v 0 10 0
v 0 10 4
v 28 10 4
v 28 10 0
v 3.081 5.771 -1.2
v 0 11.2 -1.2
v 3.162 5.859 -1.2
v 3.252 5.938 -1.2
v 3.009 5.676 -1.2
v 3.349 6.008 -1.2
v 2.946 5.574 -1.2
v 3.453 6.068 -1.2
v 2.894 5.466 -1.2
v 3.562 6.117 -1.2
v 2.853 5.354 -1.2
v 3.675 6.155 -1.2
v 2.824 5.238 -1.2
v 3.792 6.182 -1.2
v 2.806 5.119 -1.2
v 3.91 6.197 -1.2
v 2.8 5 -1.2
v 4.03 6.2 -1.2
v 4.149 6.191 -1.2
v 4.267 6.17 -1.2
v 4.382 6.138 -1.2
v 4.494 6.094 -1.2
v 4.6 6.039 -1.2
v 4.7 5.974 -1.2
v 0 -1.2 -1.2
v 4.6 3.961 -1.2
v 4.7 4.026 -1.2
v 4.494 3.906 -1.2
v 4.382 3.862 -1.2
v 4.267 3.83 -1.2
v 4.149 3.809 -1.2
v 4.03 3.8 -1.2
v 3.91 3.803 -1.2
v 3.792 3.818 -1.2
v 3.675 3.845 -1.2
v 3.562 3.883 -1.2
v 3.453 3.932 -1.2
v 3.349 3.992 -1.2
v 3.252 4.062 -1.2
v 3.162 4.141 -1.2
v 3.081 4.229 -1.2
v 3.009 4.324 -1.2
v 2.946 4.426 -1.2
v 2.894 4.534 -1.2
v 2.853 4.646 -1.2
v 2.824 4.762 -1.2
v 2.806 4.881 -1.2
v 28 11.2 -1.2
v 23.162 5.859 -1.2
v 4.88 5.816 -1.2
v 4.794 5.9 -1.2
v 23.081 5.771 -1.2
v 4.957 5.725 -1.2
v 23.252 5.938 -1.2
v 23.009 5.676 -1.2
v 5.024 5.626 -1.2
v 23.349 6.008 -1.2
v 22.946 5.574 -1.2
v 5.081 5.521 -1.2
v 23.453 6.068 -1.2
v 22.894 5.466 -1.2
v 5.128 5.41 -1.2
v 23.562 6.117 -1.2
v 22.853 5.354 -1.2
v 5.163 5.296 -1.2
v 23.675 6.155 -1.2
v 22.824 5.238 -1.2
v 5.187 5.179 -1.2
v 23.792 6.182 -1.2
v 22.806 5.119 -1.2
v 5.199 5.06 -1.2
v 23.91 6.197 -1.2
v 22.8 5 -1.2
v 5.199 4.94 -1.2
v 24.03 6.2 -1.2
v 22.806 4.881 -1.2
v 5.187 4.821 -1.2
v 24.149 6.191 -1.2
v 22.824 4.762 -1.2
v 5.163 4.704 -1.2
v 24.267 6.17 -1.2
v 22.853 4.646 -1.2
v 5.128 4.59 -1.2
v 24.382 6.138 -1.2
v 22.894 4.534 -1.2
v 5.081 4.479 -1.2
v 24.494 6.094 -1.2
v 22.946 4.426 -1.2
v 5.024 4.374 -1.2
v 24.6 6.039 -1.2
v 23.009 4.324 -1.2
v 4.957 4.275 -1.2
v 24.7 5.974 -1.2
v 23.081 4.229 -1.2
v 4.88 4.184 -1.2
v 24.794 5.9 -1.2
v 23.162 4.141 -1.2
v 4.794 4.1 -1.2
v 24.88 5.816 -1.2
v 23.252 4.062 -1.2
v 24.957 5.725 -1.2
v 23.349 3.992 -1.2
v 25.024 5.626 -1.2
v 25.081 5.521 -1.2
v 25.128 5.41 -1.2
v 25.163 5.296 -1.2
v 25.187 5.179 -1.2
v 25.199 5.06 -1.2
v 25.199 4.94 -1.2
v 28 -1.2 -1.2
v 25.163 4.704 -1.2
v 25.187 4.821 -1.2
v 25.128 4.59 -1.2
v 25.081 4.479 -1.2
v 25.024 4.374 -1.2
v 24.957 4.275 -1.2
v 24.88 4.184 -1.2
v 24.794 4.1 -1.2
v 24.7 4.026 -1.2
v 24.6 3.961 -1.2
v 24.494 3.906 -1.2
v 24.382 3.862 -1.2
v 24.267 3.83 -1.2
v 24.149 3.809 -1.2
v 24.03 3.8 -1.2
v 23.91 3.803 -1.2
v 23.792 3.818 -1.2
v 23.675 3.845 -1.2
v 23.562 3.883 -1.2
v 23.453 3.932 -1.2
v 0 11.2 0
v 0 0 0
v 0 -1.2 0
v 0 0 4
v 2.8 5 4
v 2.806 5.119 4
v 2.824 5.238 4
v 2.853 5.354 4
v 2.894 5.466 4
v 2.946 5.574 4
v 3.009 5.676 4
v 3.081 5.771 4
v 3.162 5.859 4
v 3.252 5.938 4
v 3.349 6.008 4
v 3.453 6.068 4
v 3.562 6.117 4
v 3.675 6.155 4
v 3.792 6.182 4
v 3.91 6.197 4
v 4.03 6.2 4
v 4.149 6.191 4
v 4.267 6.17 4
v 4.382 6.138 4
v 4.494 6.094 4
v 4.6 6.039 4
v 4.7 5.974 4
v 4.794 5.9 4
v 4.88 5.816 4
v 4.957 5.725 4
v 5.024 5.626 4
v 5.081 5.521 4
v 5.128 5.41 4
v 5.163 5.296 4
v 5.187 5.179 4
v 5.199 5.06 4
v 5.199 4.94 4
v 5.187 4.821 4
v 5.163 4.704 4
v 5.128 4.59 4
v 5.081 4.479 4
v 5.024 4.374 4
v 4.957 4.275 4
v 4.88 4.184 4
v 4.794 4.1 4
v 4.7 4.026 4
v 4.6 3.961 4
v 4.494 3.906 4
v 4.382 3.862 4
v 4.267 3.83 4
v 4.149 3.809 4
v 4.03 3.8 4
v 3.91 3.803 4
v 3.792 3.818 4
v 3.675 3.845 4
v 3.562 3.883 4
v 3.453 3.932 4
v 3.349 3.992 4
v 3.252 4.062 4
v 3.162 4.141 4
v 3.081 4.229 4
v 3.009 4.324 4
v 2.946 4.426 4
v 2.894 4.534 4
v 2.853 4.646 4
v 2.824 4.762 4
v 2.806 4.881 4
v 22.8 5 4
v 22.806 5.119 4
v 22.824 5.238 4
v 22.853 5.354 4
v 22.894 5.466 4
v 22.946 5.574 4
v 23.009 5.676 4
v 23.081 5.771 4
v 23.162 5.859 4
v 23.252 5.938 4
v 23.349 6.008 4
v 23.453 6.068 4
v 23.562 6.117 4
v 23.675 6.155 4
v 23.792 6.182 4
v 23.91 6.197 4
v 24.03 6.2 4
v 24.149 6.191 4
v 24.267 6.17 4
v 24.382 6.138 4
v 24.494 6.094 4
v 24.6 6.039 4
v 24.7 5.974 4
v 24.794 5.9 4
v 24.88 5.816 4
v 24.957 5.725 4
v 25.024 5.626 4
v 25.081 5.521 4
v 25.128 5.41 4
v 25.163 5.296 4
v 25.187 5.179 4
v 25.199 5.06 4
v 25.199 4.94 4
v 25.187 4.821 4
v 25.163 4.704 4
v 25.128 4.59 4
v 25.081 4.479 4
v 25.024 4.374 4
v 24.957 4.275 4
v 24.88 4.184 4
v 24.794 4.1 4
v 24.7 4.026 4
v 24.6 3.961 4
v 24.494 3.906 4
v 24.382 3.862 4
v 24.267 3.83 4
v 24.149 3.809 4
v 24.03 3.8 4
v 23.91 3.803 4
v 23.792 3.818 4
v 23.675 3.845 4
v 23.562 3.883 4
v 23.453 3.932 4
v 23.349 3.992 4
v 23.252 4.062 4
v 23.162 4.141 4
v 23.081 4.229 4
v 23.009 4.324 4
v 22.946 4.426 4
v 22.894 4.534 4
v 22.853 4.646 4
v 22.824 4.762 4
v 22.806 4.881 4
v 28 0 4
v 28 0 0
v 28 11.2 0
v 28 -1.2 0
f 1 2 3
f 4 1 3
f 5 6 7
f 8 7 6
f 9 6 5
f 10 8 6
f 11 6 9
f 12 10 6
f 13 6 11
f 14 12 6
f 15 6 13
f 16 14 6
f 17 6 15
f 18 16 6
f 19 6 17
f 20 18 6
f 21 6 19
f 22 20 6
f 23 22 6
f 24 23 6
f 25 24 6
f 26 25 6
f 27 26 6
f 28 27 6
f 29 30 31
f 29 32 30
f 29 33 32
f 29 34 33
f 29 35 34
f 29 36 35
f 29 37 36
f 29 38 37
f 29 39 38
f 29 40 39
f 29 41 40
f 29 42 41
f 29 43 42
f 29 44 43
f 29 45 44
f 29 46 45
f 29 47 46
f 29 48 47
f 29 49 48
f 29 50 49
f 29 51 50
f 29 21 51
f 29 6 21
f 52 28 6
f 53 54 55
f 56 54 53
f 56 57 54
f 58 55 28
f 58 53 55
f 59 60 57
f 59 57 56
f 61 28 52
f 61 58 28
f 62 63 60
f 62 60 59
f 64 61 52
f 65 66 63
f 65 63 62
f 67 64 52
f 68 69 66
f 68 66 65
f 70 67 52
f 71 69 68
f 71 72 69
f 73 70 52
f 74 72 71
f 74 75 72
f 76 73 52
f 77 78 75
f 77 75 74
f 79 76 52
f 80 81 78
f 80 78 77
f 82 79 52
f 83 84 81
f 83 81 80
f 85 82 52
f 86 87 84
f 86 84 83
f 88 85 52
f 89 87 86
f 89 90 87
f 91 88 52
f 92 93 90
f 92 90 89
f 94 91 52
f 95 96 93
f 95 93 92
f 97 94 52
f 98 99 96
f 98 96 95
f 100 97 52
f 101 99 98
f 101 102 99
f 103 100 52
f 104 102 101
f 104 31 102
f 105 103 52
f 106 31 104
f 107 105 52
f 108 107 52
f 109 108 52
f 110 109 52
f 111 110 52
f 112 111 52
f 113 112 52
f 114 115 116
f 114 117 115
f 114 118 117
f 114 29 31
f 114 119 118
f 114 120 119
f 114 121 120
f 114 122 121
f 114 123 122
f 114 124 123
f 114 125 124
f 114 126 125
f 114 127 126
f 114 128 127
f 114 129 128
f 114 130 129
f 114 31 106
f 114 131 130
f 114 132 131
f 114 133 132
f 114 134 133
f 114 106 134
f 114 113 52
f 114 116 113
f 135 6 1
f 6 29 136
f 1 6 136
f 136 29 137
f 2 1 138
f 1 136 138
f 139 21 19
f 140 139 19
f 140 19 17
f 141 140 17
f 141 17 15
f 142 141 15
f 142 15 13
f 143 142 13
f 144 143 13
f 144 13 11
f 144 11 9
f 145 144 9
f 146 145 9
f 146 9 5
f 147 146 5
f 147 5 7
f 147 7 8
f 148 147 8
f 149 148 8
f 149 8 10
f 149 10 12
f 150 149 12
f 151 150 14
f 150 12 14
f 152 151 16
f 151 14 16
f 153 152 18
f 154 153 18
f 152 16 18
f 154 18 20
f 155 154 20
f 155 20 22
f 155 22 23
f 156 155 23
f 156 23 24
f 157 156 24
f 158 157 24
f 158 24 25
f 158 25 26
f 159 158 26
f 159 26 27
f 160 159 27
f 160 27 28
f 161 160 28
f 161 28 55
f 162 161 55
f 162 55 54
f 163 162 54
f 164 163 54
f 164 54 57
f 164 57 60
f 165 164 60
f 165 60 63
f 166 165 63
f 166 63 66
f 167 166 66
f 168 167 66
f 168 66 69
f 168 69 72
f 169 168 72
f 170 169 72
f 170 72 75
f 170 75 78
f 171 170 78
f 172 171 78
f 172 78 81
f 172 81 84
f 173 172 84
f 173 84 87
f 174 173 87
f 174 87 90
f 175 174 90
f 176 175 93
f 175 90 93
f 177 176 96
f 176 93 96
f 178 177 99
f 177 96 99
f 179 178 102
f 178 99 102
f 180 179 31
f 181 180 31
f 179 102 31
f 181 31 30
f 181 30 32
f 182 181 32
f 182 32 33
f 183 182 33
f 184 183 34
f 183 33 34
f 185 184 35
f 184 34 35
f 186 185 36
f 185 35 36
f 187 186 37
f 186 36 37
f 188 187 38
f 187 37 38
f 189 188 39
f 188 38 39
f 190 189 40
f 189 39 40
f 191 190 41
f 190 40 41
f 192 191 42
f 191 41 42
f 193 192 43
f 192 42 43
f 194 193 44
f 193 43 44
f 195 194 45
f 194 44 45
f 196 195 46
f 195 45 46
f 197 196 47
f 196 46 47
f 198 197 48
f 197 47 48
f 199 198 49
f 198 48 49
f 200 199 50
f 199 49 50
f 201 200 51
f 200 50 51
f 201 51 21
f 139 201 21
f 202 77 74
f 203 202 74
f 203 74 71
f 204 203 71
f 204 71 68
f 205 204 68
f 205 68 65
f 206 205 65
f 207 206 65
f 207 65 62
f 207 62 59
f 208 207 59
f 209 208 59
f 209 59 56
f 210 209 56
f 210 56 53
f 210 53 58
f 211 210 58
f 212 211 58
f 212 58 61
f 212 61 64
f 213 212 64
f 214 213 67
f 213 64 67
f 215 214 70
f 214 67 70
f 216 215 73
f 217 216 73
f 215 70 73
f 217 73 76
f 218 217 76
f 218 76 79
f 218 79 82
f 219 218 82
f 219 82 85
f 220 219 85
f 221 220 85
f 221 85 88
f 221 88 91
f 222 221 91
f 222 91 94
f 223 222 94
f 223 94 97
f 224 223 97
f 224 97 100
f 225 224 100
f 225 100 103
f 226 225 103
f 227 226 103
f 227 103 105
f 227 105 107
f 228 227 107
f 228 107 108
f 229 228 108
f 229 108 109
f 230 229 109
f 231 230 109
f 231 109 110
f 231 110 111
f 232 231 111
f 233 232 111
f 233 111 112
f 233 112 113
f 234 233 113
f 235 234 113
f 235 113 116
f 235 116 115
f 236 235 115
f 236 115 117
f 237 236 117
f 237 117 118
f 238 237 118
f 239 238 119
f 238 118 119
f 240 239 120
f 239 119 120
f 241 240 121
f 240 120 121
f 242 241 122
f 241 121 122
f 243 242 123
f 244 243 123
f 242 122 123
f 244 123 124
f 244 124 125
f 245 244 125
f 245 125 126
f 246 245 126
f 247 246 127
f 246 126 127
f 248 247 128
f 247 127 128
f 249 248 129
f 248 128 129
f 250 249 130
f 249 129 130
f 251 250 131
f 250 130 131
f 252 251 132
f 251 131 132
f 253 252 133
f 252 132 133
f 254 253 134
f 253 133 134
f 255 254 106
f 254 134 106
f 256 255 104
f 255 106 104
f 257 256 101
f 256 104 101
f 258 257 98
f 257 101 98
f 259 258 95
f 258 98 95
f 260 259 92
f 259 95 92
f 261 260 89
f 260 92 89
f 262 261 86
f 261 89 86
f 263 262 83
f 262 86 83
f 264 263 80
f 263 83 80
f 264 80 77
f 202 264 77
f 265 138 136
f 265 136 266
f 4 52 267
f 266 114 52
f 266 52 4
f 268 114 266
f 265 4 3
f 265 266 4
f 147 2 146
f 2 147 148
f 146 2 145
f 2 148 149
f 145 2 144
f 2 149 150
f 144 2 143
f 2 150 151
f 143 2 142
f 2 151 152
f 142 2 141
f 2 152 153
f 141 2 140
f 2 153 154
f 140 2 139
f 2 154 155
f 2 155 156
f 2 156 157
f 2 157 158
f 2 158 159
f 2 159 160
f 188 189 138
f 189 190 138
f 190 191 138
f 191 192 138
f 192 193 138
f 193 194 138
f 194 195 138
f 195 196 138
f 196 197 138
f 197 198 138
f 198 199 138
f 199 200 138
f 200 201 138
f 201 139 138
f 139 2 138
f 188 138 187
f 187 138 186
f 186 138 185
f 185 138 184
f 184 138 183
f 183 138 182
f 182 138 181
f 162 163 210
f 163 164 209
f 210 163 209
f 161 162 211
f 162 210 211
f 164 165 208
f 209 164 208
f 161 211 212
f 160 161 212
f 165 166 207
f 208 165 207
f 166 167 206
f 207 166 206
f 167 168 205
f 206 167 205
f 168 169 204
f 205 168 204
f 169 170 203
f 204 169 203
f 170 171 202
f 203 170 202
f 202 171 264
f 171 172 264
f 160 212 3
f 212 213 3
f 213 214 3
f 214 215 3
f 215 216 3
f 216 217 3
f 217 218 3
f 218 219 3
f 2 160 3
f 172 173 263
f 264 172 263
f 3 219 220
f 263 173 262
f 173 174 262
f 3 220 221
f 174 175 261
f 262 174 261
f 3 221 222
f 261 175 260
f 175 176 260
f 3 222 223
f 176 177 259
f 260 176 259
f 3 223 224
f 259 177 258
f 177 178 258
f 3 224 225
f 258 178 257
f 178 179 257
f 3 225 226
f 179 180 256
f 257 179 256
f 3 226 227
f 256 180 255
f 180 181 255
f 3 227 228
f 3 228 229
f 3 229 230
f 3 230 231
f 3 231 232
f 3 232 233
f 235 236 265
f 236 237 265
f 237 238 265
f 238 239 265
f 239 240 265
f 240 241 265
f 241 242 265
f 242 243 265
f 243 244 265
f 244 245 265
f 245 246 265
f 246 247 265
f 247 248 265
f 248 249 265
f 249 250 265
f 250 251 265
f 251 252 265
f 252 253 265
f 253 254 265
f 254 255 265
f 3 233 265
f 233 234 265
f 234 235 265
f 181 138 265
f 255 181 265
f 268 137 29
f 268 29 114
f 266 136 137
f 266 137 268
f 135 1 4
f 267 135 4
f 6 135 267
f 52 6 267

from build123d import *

# Parameters (mm, degrees)
F0_W          = 28
F0_H          = 4
F1_DEPTH      = 10
F2_W          = 28
F2_H          = 1.2
F3_DEPTH      = 1.2
F3_DEPTH_BACK = 11.2
F5_D          = 2.4
F5_DEPTH      = 15


with BuildPart() as f1:
    # F0 (on Front) → F1 (new body)
    with BuildSketch(Plane.XZ):
        with Locations((14, 2)):
            Rectangle(F0_W, F0_H)
    extrude(amount=-F1_DEPTH)

    # F2 (on Front) → F3 (join, two sides)
    with BuildSketch(Plane.XZ) as f3_sk:
        with Locations((14, -0.6)):
            Rectangle(F2_W, F2_H)
    extrude(amount=F3_DEPTH)
    extrude(f3_sk.sketch, amount=-F3_DEPTH_BACK)

    # F5
    with Locations(Plane.XY.offset(4)):
        with Locations((4, 5), (24, 5)):
            Hole(F5_D / 2, depth=F5_DEPTH)


solid = f1.part
